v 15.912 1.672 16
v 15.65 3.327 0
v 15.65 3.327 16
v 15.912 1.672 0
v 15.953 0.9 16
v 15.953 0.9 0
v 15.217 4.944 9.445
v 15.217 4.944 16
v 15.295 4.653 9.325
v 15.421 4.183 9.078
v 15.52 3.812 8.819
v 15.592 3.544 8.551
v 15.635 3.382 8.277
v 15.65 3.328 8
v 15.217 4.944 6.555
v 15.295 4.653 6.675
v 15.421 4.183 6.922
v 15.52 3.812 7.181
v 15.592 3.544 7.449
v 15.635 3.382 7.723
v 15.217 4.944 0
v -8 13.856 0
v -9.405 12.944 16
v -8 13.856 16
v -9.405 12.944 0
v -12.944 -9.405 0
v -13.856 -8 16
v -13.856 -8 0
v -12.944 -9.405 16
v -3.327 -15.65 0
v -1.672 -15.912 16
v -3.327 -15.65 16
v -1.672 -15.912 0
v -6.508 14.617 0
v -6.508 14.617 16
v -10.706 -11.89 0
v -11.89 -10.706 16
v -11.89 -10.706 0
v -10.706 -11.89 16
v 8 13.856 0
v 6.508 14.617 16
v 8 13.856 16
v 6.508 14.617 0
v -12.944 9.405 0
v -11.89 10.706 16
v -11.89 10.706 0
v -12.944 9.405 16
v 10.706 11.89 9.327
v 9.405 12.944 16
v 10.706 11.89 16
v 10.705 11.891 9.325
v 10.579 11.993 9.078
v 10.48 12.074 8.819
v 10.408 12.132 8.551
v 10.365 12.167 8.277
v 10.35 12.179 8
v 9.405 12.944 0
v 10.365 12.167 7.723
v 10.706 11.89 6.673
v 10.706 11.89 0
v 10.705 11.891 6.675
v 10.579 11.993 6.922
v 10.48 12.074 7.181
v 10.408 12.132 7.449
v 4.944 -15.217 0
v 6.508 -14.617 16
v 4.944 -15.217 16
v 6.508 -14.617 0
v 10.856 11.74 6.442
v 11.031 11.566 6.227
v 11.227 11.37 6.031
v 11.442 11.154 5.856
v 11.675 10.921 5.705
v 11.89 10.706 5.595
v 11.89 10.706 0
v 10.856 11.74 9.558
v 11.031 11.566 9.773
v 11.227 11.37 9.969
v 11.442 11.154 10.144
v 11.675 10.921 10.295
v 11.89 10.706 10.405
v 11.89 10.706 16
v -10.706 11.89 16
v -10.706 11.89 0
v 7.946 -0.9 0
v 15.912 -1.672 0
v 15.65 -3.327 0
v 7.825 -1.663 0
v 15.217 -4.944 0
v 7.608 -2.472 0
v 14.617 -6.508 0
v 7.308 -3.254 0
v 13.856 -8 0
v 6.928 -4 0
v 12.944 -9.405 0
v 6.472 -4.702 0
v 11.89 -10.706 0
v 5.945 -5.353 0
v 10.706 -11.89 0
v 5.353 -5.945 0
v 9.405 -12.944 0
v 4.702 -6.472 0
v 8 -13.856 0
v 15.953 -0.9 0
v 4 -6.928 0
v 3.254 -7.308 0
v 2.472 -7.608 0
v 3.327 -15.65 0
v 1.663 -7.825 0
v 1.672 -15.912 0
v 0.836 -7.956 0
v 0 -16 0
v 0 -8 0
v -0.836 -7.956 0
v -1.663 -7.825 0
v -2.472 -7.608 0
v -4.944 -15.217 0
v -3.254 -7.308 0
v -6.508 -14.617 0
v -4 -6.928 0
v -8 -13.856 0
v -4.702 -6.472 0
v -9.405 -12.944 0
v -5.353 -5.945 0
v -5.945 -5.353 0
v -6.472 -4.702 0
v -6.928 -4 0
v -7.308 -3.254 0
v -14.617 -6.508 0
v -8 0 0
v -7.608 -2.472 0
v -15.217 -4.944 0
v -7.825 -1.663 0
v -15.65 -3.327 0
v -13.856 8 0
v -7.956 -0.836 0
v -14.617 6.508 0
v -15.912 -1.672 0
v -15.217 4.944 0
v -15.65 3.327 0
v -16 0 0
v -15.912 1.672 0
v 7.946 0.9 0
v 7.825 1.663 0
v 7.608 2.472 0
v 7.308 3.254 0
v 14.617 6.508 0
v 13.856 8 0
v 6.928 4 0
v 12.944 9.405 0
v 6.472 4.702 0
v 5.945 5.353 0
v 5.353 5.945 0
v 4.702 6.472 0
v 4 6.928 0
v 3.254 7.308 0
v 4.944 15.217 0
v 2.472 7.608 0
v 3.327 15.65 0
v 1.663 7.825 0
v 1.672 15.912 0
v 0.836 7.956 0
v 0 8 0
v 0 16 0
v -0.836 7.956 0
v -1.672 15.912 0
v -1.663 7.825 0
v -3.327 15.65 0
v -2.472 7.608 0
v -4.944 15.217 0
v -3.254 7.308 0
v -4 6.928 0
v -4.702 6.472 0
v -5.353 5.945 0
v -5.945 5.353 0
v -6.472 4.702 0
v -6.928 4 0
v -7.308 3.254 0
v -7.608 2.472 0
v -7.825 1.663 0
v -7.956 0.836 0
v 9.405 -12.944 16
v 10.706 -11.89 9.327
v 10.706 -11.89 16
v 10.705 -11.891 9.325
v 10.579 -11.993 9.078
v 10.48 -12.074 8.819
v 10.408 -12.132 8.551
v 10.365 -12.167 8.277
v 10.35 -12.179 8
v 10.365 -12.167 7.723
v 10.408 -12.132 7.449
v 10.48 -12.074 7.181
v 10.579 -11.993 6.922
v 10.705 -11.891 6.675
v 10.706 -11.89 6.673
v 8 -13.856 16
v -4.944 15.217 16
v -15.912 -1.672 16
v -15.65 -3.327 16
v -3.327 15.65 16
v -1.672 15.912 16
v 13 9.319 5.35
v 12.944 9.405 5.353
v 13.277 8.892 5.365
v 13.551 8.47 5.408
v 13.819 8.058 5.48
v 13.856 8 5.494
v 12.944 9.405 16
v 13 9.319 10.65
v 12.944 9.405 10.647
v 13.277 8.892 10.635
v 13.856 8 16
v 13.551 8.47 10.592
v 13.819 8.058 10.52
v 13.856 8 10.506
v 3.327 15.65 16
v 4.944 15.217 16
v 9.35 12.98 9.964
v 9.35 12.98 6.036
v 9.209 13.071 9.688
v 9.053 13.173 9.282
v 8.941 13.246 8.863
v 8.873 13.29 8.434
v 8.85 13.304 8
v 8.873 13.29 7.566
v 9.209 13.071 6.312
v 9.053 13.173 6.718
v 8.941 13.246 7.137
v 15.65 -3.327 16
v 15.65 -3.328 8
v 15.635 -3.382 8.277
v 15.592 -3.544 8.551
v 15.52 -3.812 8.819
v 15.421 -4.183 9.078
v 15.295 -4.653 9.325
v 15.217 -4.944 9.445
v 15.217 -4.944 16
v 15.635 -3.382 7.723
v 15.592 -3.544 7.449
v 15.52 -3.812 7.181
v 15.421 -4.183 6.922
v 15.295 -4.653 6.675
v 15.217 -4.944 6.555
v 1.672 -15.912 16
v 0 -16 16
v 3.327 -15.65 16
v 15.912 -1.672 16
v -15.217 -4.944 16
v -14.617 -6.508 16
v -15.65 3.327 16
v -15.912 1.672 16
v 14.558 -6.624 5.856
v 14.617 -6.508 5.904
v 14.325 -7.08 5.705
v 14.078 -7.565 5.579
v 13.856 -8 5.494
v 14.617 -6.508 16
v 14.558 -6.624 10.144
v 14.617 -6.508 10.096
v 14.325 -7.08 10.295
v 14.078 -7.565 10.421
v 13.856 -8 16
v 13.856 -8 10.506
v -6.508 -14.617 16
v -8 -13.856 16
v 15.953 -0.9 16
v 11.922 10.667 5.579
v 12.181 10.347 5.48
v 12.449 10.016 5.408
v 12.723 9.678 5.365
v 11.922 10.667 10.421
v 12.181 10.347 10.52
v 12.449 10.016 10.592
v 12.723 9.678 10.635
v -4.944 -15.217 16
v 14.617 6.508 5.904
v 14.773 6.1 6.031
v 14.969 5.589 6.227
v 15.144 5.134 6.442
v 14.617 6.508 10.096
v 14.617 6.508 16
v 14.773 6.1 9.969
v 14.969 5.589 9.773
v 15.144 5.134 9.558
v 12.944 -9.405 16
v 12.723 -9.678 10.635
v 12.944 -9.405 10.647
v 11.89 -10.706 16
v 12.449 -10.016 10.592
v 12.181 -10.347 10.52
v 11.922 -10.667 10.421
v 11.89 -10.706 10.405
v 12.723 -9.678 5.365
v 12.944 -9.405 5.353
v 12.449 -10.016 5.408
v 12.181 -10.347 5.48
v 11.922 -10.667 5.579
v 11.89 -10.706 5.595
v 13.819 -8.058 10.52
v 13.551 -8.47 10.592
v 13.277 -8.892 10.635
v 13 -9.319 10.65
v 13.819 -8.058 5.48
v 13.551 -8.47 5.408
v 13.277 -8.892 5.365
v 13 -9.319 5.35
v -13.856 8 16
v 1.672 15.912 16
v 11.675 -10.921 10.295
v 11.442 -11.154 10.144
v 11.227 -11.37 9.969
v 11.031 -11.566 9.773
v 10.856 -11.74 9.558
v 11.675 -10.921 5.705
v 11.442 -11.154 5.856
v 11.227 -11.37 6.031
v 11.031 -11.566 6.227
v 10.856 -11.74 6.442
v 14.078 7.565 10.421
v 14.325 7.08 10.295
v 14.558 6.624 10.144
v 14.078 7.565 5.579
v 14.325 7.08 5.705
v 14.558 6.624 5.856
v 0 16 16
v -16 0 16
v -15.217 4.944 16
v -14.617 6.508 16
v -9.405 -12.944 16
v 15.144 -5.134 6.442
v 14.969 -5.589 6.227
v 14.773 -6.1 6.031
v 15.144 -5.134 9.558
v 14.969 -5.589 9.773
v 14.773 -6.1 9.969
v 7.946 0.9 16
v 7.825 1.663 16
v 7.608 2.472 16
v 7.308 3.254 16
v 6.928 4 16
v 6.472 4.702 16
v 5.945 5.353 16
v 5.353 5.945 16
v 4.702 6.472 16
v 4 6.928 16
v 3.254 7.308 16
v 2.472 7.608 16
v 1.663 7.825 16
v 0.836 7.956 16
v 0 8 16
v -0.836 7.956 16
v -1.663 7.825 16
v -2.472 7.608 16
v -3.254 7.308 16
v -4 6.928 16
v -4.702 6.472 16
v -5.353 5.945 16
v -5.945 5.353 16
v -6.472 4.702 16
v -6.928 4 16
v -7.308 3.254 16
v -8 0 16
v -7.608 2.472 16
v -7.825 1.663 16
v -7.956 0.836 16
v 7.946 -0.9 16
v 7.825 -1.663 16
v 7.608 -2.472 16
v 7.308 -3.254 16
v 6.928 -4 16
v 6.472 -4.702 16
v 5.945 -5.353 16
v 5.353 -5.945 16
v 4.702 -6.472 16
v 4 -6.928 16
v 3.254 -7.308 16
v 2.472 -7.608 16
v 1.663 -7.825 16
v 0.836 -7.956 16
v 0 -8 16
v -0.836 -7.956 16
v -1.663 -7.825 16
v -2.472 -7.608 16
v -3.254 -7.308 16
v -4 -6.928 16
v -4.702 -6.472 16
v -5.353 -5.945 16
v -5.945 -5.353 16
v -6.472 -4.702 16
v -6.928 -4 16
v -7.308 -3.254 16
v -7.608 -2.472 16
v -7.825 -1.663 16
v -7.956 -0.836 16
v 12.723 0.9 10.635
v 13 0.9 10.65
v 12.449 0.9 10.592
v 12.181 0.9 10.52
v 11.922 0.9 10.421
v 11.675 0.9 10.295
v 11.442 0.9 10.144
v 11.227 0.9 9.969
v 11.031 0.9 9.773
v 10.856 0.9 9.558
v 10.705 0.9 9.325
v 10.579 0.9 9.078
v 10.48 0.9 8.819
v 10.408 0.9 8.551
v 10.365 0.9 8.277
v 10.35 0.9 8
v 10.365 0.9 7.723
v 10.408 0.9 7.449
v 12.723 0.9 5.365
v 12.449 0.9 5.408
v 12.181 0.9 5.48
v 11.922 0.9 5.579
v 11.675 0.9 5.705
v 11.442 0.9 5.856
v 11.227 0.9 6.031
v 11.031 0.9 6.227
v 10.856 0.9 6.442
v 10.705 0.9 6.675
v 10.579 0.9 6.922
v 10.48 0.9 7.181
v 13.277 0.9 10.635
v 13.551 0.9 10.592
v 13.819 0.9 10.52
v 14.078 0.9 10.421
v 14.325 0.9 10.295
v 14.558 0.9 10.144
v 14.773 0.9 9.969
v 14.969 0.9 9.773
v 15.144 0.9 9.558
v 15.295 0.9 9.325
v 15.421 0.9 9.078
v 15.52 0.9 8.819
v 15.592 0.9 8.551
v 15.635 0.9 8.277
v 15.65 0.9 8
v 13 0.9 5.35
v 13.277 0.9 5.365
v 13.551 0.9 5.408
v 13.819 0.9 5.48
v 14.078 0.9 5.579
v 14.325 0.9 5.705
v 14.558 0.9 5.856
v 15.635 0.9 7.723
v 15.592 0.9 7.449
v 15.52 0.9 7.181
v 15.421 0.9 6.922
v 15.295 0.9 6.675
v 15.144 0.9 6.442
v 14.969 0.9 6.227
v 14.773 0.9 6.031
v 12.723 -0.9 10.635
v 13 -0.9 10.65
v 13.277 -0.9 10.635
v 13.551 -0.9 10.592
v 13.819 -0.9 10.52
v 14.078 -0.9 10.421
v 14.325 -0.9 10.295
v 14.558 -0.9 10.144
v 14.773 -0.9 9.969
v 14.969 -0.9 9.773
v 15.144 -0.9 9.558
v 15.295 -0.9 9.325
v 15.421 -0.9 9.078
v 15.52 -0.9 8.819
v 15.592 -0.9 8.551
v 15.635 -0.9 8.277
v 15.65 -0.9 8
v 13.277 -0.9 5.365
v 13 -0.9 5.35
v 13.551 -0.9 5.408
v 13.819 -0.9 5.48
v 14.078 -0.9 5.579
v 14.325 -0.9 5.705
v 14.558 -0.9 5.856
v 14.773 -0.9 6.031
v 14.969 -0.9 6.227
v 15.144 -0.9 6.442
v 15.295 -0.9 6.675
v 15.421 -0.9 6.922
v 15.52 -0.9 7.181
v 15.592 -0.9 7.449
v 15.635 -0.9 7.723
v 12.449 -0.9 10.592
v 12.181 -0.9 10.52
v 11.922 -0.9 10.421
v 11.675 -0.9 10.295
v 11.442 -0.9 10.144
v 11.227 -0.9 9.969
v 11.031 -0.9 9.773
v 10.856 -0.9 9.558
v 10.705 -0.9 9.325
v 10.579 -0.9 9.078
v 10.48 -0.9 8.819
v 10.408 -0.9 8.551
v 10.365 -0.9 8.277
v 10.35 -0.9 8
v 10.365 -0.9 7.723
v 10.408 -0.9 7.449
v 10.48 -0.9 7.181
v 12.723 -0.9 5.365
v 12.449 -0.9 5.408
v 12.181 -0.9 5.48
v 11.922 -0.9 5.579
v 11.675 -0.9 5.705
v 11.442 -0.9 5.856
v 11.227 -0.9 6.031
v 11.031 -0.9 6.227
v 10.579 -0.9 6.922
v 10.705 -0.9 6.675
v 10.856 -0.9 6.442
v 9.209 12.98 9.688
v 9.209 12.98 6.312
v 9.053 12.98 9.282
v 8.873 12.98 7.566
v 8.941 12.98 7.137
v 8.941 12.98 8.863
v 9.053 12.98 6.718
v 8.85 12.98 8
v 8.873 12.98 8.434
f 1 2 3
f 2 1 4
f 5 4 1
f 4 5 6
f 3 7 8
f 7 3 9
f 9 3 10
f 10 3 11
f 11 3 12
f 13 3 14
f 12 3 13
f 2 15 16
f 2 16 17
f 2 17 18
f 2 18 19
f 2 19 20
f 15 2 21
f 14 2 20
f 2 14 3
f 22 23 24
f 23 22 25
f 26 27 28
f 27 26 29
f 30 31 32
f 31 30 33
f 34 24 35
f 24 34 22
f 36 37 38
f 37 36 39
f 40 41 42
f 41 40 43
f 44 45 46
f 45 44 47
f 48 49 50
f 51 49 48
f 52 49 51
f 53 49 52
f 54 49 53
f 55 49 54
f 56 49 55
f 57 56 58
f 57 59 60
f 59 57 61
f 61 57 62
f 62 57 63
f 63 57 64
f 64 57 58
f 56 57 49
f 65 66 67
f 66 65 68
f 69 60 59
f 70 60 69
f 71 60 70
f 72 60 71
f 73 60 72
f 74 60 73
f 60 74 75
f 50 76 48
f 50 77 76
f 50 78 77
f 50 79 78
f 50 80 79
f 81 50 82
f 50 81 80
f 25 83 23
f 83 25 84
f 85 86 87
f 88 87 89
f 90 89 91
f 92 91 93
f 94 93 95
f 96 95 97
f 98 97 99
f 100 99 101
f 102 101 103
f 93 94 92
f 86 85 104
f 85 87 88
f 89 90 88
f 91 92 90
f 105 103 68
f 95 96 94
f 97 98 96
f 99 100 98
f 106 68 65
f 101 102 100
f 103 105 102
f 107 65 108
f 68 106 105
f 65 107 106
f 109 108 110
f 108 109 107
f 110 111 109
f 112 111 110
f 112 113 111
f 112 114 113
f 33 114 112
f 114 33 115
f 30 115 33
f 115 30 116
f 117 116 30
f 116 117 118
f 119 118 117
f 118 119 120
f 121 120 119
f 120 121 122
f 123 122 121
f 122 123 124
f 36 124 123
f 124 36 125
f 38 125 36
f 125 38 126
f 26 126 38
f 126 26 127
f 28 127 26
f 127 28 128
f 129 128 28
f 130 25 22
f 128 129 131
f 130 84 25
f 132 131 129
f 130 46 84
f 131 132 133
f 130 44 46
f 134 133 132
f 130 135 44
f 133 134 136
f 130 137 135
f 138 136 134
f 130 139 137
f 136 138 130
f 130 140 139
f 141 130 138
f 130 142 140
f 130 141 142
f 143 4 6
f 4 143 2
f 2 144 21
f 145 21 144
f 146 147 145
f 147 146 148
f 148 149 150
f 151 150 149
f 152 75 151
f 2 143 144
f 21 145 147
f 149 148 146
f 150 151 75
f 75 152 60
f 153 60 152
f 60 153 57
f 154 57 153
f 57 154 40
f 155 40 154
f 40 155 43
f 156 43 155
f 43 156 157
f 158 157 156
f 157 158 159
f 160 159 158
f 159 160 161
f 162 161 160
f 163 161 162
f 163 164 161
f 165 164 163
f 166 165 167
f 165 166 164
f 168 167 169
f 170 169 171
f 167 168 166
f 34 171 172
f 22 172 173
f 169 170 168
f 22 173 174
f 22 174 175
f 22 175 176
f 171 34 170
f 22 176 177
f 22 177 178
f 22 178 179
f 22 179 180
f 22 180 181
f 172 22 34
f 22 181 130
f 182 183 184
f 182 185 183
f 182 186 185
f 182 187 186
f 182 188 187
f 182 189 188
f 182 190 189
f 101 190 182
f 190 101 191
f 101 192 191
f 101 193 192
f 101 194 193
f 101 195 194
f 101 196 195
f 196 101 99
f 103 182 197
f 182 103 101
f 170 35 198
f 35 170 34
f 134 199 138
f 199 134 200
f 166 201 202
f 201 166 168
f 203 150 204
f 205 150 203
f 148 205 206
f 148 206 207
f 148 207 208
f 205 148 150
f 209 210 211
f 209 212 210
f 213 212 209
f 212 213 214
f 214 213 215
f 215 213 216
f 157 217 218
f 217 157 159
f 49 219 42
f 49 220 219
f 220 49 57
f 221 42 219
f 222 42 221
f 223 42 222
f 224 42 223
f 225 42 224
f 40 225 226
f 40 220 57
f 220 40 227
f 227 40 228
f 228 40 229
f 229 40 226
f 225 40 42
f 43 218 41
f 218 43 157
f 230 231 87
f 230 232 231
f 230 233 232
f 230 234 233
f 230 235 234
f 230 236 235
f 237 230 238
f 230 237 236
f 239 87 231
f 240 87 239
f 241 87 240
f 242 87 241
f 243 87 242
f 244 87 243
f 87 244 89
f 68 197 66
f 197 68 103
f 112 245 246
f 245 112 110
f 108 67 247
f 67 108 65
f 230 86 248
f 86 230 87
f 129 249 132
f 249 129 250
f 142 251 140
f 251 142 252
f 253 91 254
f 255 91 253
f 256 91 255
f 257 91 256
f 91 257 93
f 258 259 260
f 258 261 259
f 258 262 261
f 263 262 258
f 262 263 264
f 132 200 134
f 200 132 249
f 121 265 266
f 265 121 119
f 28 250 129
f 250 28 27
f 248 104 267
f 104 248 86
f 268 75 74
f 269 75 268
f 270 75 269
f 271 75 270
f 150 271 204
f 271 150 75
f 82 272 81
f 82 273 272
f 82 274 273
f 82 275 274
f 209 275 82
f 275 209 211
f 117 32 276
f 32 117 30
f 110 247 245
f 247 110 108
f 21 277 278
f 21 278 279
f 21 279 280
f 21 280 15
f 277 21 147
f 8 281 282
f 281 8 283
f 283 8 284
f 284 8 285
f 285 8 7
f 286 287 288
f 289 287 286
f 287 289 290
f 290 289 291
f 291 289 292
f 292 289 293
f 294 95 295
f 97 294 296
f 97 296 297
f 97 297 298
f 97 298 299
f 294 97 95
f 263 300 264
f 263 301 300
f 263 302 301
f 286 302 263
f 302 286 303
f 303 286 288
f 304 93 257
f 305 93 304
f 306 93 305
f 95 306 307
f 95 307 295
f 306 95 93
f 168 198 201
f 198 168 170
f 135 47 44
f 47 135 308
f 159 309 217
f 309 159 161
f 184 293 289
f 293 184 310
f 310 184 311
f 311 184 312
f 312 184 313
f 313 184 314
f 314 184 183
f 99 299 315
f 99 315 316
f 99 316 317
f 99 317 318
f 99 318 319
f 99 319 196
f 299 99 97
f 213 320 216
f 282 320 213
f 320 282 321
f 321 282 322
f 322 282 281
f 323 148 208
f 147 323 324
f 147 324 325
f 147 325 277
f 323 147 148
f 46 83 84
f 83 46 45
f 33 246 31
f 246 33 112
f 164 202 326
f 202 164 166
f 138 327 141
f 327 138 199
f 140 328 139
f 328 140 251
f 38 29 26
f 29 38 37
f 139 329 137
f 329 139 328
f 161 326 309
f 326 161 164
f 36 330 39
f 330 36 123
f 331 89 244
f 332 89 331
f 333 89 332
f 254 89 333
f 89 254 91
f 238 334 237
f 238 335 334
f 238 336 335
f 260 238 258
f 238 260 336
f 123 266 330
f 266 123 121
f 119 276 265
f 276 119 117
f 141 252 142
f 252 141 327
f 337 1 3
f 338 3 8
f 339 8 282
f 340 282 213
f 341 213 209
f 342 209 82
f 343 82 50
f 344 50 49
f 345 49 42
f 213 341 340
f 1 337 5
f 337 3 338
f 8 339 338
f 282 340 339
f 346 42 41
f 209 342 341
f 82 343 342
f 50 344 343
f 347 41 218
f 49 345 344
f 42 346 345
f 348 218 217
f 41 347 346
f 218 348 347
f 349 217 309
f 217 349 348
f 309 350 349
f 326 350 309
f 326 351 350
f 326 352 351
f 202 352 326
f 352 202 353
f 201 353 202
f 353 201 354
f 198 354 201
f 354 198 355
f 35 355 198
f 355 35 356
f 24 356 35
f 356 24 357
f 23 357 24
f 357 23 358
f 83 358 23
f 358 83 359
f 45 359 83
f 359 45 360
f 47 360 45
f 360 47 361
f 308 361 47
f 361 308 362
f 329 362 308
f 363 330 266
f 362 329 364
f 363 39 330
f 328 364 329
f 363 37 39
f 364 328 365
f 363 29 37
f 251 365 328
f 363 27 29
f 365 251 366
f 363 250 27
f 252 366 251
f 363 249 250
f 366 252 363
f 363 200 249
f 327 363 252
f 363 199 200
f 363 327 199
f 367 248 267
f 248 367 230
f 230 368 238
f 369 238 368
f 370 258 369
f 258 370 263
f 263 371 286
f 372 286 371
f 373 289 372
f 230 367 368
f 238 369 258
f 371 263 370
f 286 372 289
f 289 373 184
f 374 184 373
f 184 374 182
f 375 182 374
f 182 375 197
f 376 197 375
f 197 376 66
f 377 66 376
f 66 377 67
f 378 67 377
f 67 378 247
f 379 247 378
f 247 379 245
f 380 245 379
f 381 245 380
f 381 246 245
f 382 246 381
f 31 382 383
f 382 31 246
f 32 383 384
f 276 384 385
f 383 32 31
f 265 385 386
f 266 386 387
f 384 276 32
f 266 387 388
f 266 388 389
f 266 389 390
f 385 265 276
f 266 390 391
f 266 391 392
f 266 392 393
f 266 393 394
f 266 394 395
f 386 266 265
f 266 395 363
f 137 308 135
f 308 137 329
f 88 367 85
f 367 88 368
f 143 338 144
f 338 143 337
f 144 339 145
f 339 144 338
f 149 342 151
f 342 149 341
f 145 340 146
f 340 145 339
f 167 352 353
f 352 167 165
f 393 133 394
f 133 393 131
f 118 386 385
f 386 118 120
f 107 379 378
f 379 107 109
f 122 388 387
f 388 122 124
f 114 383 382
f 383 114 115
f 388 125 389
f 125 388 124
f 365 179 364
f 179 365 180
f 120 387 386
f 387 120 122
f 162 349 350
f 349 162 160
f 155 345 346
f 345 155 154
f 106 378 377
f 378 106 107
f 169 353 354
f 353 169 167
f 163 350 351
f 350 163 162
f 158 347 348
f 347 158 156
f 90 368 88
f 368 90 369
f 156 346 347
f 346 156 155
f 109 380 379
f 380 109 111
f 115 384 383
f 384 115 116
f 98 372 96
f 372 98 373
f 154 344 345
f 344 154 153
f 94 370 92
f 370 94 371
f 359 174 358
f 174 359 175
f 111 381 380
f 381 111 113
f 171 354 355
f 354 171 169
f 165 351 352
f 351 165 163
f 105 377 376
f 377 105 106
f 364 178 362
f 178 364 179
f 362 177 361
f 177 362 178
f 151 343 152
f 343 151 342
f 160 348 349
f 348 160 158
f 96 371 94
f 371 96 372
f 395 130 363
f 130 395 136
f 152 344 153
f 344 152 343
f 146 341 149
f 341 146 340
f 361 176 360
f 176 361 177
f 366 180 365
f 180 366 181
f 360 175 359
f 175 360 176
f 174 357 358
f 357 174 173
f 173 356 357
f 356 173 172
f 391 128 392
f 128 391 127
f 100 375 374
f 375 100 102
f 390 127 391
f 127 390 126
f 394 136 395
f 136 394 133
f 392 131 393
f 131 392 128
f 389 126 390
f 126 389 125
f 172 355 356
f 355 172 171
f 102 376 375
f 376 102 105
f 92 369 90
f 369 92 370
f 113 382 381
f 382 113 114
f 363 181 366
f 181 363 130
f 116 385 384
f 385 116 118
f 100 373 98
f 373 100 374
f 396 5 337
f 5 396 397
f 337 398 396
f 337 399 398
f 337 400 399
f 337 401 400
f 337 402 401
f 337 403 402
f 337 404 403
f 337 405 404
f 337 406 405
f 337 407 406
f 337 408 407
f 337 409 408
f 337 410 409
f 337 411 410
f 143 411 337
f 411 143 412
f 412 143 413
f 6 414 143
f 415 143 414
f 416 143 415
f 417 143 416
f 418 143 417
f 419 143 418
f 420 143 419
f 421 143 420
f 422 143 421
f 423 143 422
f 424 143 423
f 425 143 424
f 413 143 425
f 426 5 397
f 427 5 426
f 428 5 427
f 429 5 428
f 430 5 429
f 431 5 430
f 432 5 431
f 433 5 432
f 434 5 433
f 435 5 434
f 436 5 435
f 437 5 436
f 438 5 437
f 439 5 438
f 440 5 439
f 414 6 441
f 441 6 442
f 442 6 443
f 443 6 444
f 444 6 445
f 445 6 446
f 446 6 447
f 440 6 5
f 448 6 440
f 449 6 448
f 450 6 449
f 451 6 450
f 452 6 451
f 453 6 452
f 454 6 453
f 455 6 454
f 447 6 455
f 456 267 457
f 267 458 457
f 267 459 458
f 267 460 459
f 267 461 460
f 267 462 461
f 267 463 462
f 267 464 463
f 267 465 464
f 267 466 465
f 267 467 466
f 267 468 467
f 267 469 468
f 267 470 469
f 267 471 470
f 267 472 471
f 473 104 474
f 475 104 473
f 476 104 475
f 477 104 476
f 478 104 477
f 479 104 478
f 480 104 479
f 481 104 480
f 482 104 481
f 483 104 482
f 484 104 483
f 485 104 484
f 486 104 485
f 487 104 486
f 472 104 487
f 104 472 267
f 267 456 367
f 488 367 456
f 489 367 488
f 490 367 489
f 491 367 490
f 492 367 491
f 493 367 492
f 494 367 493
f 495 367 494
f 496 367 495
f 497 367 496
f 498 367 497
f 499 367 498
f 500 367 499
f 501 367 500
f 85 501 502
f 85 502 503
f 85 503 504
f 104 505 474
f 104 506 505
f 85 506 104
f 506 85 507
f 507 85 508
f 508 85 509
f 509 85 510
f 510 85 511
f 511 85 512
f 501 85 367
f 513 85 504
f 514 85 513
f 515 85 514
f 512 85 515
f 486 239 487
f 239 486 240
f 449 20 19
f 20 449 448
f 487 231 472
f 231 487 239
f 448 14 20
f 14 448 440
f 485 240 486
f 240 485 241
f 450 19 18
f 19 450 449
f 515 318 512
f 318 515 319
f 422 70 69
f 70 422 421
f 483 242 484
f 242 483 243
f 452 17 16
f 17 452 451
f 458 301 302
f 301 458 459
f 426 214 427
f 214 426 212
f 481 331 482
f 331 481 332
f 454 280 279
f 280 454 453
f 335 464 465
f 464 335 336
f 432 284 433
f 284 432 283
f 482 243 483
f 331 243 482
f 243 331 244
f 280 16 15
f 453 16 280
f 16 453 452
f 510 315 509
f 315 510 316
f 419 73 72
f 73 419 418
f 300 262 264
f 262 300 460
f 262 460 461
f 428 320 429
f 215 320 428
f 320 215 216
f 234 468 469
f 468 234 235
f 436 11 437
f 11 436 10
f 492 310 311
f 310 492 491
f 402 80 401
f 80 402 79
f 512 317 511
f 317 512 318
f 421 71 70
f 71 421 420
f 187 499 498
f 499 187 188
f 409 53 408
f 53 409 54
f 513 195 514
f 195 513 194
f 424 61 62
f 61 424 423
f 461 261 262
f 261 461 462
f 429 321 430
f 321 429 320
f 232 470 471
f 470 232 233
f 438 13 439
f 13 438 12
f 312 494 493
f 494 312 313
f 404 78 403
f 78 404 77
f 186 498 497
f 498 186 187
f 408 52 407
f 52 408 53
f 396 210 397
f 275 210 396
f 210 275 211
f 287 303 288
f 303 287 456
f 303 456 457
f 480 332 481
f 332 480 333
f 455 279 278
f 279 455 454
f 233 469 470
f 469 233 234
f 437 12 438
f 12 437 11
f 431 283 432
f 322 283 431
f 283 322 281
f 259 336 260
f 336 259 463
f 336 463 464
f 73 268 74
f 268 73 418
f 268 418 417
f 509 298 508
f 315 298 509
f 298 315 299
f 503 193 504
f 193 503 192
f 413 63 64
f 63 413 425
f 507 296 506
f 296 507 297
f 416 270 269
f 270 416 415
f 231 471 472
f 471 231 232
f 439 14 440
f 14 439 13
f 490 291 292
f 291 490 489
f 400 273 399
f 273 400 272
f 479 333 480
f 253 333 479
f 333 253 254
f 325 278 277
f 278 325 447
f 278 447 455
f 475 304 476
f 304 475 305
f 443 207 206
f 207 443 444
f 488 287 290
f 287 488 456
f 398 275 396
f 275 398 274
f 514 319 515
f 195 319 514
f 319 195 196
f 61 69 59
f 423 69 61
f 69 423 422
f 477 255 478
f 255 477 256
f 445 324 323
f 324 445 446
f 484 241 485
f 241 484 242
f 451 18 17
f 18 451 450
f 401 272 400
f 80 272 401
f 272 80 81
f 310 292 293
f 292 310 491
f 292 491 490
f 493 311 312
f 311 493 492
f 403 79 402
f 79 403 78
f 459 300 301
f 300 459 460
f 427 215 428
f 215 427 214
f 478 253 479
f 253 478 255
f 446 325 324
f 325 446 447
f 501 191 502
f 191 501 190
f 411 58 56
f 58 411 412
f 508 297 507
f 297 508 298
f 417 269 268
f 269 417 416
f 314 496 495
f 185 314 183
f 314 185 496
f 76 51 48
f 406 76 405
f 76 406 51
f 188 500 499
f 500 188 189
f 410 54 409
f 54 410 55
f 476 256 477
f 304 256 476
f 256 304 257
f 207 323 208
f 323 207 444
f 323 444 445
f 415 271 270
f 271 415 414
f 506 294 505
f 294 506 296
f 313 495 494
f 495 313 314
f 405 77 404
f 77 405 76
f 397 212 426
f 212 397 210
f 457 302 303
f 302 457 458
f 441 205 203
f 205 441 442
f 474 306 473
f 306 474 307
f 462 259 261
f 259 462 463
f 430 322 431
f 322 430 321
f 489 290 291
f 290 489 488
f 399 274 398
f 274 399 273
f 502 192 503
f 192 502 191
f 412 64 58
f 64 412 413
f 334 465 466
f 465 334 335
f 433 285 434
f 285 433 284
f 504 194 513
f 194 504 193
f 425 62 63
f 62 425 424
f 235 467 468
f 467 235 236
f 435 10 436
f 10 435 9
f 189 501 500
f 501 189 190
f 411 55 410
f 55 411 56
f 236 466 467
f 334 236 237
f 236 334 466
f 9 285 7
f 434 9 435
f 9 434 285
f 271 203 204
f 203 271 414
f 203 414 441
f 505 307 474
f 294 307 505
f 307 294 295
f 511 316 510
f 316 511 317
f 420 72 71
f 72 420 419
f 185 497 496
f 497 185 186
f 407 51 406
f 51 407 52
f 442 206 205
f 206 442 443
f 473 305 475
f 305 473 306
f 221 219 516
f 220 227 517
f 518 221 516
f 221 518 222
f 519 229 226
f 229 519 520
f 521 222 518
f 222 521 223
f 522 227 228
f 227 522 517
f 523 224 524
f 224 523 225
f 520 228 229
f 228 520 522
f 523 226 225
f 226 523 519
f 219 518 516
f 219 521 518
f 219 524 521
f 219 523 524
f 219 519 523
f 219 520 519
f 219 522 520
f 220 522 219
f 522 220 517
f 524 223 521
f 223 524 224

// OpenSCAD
// C-style split collar for 16 mm shaft.
$fn = 60;
eps = 0.02;
shaft_d = 16;
outer_d = 32;
width = 16;
slit_w = 1.8;
screw_d = 5.3;
difference() {
    cylinder(d = outer_d, h = width);
    translate([0, 0, -eps]) cylinder(d = shaft_d, h = width + 2 * eps);
    translate([0, -slit_w / 2, -eps]) cube([outer_d / 2 + eps, slit_w, width + 2 * eps]);
    translate([outer_d / 2 - 3, -outer_d / 2 - eps, width / 2]) rotate([-90, 0, 0]) cylinder(d = screw_d, h = outer_d + 2 * eps);
    translate([outer_d / 2 - 3, outer_d / 2 - 3 - eps, width / 2]) rotate([-90, 0, 0]) cylinder(d = screw_d + 3, h = 3 + 2 * eps);
}
